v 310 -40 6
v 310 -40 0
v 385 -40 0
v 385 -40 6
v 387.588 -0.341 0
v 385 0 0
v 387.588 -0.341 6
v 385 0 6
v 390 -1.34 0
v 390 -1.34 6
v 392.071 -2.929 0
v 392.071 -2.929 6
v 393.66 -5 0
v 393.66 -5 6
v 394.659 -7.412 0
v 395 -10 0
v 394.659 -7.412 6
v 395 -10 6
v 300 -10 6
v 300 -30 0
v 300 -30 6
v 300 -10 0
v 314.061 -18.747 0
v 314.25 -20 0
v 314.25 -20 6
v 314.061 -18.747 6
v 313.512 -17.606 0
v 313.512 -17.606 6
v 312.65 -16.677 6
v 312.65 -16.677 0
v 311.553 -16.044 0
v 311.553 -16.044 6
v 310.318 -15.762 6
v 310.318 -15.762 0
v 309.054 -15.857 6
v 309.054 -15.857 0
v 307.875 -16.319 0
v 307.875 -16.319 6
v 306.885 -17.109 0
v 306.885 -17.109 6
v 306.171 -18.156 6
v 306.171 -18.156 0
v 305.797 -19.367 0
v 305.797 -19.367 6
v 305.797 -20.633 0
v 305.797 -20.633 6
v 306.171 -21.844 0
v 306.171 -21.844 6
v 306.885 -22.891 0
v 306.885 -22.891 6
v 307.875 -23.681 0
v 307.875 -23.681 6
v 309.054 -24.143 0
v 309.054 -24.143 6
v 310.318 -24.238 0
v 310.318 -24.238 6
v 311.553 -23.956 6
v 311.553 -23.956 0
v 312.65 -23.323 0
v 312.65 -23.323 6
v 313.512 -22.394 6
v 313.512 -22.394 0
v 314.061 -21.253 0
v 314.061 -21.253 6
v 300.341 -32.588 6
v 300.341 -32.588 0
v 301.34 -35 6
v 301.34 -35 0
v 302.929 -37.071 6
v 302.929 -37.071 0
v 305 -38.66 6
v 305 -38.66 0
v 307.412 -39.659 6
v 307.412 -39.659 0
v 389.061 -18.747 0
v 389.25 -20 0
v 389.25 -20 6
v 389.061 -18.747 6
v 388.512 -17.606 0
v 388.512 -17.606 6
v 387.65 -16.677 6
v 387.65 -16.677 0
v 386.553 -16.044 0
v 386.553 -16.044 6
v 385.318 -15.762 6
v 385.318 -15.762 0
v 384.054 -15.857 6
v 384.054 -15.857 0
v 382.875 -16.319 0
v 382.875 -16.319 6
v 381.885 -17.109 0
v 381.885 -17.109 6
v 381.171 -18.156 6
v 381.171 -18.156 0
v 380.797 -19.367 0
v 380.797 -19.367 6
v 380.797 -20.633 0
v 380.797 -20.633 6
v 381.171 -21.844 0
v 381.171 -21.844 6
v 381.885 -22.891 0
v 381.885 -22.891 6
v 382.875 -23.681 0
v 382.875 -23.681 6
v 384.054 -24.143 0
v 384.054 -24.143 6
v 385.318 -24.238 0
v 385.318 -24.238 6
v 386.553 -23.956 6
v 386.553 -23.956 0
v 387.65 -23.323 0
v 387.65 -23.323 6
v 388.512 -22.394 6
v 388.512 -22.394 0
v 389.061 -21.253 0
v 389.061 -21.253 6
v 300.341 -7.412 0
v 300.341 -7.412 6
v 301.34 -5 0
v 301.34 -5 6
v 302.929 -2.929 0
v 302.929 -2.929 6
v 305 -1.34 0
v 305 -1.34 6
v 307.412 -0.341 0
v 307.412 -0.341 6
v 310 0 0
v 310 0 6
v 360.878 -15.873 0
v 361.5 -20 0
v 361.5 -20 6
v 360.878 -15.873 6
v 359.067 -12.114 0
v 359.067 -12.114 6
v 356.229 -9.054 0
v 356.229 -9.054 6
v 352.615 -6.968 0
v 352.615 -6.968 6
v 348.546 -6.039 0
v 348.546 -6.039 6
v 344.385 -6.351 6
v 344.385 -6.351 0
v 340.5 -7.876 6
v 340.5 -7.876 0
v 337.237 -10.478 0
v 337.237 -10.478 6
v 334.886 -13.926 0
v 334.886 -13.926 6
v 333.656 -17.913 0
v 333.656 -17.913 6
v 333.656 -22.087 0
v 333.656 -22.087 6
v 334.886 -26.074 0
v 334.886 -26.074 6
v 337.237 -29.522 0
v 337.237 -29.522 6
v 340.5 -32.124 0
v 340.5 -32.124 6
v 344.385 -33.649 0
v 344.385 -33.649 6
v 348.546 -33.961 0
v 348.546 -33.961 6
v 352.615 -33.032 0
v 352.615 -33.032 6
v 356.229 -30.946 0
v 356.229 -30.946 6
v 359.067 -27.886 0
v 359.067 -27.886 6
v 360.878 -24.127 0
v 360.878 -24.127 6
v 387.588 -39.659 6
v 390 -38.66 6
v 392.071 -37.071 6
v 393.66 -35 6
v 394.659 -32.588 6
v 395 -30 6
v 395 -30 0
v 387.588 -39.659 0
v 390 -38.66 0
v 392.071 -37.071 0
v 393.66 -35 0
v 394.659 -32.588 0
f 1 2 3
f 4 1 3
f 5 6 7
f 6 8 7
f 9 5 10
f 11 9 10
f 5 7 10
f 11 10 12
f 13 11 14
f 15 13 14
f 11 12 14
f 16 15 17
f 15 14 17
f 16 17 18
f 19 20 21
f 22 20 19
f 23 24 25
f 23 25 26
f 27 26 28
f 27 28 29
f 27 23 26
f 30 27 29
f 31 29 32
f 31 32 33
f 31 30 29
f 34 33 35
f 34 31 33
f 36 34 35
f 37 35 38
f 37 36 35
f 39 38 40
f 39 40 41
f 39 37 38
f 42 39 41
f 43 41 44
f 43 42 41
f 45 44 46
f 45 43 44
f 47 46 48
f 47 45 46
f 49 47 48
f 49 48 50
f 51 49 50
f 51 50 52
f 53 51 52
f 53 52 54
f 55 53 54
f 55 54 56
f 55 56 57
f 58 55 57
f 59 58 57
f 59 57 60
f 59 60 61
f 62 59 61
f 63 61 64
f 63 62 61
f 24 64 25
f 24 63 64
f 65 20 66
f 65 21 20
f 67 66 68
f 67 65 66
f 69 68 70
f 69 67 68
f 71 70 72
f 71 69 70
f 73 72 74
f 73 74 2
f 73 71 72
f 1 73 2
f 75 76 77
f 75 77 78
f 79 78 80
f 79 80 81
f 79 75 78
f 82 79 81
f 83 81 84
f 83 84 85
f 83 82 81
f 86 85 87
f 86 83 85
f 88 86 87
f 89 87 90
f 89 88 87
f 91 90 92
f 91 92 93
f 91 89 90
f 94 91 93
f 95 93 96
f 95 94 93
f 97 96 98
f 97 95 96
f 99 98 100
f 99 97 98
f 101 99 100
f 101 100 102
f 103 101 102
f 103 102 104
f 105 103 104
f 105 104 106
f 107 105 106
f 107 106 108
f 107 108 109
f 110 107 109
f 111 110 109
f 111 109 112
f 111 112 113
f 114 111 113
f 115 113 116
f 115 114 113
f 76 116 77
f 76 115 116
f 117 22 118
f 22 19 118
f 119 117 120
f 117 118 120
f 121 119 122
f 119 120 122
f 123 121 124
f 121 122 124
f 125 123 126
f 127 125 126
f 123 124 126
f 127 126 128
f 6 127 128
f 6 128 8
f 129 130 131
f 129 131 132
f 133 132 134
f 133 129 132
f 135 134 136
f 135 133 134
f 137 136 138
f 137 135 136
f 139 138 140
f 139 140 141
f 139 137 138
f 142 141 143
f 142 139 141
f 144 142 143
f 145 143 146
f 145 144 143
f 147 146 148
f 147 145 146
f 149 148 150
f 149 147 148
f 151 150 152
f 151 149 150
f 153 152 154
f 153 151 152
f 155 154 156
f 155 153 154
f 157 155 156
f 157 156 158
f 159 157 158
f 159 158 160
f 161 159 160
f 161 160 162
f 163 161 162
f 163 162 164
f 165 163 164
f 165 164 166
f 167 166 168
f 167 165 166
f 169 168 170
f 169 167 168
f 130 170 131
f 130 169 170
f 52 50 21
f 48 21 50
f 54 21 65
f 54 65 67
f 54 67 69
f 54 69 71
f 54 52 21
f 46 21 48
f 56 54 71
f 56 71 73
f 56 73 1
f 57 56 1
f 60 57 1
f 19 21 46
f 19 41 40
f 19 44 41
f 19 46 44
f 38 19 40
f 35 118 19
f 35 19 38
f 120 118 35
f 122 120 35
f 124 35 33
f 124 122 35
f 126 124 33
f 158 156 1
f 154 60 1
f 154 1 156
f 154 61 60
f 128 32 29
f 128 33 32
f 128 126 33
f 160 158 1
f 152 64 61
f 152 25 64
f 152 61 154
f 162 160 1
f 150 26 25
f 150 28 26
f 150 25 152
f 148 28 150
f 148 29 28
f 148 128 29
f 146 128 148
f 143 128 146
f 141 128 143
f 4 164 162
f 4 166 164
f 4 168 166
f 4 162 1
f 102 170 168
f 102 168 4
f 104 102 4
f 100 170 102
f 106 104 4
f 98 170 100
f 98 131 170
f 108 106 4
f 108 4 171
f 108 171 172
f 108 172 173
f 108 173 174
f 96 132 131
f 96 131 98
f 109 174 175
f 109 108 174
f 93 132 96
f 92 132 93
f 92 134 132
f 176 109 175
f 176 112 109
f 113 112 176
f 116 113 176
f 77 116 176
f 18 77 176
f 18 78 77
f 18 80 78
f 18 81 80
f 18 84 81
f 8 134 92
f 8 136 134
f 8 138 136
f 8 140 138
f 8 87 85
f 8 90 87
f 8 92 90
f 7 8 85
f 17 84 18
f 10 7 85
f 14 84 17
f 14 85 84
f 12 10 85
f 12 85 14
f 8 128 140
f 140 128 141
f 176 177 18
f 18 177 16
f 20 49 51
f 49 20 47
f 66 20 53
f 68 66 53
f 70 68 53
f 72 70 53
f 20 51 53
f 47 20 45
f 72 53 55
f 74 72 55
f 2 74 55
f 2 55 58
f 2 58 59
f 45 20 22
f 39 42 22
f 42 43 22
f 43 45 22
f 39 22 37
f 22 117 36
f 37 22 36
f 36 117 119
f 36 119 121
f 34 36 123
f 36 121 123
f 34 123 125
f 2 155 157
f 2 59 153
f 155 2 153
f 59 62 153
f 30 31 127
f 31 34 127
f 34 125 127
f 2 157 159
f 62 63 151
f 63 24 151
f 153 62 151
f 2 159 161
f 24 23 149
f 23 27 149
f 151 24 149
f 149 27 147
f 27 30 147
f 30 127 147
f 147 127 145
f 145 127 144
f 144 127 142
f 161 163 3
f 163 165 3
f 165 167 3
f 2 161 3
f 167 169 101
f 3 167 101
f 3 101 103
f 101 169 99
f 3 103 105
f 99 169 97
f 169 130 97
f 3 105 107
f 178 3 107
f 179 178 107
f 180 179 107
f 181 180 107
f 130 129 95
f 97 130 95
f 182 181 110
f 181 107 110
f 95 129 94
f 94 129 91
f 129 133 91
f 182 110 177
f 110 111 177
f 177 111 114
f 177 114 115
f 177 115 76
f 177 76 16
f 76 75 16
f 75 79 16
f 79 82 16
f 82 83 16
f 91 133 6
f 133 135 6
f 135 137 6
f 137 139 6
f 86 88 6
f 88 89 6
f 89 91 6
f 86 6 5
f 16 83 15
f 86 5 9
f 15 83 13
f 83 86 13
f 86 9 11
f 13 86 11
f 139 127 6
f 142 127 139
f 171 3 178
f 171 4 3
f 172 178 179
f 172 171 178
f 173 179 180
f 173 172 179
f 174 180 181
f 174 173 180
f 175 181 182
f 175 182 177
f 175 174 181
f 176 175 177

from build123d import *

# Parameters (mm, degrees)
SKETCH1_W           = 95
SKETCH1_H           = 40
SKETCH1_R           = 14
SKETCH1_R_2         = 4.25
BOSS_EXTRUDE1_DEPTH = 6
FILLET1_R           = 10


with BuildPart() as part:
    # Sketch1 → Boss-Extrude1 (new body)
    with BuildSketch(Plane.XY):
        with Locations((347.5, -20)):
            Rectangle(SKETCH1_W, SKETCH1_H)
        with Locations((347.5, -20)):
            Circle(SKETCH1_R, mode=Mode.SUBTRACT)
        with Locations((385, -20)):
            Circle(SKETCH1_R_2, mode=Mode.SUBTRACT)
        with Locations((310, -20)):
            Circle(SKETCH1_R_2, mode=Mode.SUBTRACT)
    extrude(amount=BOSS_EXTRUDE1_DEPTH)

    # Fillet1
    fillet1_edges = [part.edges().sort_by_distance(p)[0] for p in [
        (395, -40, 3),
        (300, -40, 3),
        (300, 0, 3),
        (395, 0, 3),
    ]]
    fillet(fillet1_edges, radius=FILLET1_R)


solid = part.part
